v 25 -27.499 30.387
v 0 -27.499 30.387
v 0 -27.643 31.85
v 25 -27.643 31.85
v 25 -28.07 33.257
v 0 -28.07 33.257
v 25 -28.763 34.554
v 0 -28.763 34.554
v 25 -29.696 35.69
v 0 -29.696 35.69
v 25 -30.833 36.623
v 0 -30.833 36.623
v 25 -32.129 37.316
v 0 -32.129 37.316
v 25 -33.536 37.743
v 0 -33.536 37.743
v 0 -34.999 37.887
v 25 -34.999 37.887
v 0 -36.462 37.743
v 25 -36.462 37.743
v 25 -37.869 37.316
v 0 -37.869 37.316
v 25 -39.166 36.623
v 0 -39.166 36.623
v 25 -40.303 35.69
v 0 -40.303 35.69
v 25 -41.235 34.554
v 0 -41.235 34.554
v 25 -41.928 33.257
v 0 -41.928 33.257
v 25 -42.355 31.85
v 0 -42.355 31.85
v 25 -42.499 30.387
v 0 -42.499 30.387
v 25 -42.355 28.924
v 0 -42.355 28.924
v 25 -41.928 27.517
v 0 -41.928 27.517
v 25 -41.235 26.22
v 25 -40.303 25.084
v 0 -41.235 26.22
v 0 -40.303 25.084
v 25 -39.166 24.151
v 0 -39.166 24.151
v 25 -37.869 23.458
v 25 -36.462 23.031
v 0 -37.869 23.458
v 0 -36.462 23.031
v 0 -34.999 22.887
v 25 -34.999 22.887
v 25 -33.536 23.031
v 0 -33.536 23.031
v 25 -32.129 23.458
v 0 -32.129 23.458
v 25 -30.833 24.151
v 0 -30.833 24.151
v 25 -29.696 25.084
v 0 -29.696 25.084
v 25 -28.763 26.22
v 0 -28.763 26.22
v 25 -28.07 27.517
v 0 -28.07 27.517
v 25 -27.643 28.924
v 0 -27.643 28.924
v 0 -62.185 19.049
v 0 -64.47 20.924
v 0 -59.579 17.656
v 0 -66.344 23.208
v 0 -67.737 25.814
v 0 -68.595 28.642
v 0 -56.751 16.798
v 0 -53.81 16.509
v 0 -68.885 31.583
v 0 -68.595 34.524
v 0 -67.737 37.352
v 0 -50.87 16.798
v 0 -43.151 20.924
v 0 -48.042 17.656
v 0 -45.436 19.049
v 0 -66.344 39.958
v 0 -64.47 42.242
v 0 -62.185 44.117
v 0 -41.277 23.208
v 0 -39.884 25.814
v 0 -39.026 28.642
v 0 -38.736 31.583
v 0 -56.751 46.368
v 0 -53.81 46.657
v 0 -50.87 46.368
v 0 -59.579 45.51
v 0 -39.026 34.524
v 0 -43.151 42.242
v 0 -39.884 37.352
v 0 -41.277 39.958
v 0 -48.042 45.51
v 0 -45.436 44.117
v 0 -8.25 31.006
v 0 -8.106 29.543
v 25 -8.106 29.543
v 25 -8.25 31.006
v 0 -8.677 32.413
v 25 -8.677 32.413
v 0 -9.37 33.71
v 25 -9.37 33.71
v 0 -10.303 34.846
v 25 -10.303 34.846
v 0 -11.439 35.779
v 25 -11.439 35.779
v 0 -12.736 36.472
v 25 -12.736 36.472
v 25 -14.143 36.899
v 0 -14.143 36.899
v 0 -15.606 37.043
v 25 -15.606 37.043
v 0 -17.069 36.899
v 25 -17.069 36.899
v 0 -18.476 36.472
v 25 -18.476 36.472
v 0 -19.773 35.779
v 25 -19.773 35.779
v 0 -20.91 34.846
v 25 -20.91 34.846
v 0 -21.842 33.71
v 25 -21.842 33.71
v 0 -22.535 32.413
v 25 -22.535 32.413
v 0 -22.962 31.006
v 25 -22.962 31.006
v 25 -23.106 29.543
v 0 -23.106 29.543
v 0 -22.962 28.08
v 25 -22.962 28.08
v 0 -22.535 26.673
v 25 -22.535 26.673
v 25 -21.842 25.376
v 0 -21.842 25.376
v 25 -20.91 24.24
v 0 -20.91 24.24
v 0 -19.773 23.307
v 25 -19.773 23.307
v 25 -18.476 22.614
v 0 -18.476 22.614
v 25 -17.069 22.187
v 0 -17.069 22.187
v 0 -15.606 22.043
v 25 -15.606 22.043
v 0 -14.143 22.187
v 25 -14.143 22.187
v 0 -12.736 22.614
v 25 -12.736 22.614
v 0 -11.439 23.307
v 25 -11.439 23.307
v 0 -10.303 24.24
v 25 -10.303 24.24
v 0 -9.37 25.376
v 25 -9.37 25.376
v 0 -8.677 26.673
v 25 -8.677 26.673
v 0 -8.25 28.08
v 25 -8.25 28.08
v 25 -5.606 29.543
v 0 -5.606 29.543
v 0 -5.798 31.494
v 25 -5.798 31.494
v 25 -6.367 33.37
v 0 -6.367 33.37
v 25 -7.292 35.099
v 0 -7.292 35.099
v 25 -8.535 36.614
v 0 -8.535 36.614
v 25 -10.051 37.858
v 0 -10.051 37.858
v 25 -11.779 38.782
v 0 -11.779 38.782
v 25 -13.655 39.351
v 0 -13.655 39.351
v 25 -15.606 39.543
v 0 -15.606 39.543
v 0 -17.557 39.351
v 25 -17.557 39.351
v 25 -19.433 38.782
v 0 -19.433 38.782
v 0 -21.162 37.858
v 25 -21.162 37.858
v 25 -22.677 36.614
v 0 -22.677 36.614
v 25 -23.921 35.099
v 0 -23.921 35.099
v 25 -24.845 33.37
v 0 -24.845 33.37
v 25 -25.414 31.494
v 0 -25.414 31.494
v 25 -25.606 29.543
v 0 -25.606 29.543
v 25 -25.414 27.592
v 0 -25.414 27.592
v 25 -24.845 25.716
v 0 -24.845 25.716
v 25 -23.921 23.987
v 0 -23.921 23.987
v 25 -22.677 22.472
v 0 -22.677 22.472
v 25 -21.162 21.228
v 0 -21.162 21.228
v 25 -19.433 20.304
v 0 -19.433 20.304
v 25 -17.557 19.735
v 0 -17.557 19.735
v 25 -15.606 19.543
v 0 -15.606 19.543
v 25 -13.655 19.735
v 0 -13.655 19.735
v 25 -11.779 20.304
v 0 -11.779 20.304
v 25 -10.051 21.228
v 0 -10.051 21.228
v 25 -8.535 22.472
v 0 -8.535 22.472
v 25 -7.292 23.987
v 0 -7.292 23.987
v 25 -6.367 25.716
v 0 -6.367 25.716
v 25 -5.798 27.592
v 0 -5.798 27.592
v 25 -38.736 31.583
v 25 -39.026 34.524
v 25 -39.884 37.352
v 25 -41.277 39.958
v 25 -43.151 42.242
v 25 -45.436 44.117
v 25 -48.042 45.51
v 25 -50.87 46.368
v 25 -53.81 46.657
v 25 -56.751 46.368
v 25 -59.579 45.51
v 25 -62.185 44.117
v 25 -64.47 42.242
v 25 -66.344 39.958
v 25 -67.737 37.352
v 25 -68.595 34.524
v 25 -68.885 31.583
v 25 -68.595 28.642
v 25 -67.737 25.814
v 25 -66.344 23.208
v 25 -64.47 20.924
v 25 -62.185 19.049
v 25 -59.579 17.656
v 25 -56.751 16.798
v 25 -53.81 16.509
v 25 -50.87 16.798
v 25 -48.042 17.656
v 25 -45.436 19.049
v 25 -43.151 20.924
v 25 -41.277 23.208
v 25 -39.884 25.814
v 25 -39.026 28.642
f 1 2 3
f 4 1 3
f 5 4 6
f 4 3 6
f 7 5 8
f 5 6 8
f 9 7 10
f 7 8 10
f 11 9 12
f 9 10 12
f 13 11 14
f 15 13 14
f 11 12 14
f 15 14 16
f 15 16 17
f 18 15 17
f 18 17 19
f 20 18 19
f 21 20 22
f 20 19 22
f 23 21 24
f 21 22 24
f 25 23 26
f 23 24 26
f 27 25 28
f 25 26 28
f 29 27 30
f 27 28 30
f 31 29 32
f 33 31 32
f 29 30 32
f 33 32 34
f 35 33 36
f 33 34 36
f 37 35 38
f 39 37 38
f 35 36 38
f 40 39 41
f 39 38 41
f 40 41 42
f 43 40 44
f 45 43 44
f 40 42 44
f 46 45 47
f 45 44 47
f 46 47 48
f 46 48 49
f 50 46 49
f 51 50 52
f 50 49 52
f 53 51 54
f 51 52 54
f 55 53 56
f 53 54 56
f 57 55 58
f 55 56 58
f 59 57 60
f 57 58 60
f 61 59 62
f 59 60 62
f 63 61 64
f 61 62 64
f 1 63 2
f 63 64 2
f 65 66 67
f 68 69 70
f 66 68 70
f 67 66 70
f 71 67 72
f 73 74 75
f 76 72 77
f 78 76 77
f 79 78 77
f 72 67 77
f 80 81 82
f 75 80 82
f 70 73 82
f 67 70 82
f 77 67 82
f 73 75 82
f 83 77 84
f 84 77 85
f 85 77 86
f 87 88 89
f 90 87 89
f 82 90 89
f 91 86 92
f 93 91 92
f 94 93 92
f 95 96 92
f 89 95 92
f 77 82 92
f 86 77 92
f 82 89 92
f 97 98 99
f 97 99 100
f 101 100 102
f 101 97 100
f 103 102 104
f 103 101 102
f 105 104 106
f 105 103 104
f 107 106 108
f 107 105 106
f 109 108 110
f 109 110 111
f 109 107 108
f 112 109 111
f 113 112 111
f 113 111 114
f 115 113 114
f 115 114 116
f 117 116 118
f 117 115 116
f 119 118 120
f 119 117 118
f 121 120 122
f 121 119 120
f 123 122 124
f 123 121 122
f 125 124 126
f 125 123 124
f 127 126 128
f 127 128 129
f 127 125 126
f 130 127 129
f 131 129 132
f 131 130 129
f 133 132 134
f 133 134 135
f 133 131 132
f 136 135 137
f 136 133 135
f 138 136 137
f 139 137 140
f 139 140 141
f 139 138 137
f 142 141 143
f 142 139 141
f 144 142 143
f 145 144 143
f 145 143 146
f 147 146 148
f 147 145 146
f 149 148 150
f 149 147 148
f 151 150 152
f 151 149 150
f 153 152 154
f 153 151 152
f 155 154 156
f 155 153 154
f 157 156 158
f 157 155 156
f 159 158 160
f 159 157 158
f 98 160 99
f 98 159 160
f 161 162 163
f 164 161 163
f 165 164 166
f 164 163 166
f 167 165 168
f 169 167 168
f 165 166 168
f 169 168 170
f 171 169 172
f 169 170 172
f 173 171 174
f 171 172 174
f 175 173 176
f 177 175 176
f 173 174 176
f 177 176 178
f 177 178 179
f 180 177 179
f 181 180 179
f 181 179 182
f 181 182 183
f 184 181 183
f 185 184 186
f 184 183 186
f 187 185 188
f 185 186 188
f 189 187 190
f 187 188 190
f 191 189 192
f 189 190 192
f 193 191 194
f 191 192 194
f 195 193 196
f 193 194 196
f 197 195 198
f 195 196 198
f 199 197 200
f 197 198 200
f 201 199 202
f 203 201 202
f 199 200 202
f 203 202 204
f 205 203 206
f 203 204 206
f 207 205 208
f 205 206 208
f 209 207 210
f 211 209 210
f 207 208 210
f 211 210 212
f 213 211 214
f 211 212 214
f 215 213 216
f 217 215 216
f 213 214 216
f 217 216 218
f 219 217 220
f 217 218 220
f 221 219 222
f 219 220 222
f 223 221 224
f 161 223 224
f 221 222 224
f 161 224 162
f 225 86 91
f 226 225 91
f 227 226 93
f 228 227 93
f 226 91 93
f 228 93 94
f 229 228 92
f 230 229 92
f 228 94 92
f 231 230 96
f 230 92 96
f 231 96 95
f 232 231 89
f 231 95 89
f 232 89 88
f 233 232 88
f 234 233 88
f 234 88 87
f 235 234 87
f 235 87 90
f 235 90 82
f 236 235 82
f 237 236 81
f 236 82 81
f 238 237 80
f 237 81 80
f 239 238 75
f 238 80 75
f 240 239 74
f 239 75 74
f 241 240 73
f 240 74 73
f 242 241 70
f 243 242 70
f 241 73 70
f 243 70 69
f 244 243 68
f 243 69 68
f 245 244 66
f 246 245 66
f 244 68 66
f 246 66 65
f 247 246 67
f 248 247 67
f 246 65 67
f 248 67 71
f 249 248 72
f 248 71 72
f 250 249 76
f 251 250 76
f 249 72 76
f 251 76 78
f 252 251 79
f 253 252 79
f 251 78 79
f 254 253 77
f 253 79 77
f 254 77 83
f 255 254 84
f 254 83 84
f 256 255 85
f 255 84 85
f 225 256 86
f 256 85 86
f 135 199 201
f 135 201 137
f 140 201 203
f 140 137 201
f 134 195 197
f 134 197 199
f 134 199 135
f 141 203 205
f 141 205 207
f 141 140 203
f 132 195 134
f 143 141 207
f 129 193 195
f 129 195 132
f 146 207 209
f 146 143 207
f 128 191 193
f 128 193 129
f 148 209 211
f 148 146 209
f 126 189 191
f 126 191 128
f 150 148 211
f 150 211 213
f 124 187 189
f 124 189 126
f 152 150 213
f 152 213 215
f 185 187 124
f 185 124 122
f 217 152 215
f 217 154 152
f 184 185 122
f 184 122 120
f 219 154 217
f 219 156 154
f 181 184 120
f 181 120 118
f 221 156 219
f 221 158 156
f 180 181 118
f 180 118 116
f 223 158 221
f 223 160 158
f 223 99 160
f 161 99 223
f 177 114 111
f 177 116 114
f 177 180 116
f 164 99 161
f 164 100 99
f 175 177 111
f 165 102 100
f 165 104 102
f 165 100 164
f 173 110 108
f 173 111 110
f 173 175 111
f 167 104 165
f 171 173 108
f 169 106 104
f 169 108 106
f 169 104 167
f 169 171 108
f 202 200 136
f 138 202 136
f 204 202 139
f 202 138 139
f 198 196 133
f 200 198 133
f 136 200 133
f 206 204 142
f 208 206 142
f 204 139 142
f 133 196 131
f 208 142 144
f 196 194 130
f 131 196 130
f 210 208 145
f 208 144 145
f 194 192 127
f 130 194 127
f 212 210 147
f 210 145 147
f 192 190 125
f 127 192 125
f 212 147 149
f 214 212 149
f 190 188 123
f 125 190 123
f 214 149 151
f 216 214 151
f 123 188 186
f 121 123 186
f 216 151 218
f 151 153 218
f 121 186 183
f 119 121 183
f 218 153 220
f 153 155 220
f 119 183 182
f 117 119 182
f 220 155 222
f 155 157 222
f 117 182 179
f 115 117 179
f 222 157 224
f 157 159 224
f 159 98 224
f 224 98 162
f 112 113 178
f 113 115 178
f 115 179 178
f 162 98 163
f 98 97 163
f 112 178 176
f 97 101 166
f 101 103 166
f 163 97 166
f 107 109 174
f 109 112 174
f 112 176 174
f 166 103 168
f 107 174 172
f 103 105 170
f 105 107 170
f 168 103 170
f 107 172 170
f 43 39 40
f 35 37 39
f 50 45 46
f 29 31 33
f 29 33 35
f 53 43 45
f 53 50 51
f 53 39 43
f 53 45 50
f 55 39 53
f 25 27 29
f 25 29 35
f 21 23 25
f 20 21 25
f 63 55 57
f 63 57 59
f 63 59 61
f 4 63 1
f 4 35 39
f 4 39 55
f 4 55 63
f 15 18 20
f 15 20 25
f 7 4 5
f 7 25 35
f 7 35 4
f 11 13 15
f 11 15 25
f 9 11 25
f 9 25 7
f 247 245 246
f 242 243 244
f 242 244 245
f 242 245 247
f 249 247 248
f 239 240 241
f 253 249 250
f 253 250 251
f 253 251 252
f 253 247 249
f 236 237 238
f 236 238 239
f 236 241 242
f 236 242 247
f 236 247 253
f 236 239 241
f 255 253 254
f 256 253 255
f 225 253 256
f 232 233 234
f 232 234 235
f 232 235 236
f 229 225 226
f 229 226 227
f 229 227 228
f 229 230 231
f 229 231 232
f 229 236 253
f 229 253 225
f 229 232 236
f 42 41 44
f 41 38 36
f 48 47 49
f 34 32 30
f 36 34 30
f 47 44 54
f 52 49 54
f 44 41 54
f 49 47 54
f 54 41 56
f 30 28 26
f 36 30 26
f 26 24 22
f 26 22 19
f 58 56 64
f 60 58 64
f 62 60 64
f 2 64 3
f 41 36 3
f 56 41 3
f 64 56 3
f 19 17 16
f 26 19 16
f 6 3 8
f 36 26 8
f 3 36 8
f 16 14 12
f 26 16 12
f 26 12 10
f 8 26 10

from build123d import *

# Parameters (mm, degrees)
F0_R     = 15.07436
F3_DEPTH = 25
F1_R     = 7.5
F4_DEPTH = 25
F2_R     = 10
F2_R_2   = 7.5
F5_DEPTH = 25


with BuildPart() as f3:
    # F0 (on Right) → F3 (new body)
    with BuildSketch(Plane.YZ):
        with Locations((-53.810444, 31.583011)):
            Circle(F0_R)
    extrude(amount=F3_DEPTH)


with BuildPart() as f4:
    # F1 (on Right) → F4 (new body)
    with BuildSketch(Plane.YZ):
        with Locations((-34.999277, 30.387111)):
            Circle(F1_R)
    extrude(amount=F4_DEPTH)


with BuildPart() as f5:
    # F2 (on Right) → F5 (new body)
    with BuildSketch(Plane.YZ):
        with Locations((-15.606225, 29.542951)):
            Circle(F2_R)
        with Locations((-15.606225, 29.542951)):
            Circle(F2_R_2, mode=Mode.SUBTRACT)
    extrude(amount=F5_DEPTH)


solid = Compound([f3.part, f4.part, f5.part])
